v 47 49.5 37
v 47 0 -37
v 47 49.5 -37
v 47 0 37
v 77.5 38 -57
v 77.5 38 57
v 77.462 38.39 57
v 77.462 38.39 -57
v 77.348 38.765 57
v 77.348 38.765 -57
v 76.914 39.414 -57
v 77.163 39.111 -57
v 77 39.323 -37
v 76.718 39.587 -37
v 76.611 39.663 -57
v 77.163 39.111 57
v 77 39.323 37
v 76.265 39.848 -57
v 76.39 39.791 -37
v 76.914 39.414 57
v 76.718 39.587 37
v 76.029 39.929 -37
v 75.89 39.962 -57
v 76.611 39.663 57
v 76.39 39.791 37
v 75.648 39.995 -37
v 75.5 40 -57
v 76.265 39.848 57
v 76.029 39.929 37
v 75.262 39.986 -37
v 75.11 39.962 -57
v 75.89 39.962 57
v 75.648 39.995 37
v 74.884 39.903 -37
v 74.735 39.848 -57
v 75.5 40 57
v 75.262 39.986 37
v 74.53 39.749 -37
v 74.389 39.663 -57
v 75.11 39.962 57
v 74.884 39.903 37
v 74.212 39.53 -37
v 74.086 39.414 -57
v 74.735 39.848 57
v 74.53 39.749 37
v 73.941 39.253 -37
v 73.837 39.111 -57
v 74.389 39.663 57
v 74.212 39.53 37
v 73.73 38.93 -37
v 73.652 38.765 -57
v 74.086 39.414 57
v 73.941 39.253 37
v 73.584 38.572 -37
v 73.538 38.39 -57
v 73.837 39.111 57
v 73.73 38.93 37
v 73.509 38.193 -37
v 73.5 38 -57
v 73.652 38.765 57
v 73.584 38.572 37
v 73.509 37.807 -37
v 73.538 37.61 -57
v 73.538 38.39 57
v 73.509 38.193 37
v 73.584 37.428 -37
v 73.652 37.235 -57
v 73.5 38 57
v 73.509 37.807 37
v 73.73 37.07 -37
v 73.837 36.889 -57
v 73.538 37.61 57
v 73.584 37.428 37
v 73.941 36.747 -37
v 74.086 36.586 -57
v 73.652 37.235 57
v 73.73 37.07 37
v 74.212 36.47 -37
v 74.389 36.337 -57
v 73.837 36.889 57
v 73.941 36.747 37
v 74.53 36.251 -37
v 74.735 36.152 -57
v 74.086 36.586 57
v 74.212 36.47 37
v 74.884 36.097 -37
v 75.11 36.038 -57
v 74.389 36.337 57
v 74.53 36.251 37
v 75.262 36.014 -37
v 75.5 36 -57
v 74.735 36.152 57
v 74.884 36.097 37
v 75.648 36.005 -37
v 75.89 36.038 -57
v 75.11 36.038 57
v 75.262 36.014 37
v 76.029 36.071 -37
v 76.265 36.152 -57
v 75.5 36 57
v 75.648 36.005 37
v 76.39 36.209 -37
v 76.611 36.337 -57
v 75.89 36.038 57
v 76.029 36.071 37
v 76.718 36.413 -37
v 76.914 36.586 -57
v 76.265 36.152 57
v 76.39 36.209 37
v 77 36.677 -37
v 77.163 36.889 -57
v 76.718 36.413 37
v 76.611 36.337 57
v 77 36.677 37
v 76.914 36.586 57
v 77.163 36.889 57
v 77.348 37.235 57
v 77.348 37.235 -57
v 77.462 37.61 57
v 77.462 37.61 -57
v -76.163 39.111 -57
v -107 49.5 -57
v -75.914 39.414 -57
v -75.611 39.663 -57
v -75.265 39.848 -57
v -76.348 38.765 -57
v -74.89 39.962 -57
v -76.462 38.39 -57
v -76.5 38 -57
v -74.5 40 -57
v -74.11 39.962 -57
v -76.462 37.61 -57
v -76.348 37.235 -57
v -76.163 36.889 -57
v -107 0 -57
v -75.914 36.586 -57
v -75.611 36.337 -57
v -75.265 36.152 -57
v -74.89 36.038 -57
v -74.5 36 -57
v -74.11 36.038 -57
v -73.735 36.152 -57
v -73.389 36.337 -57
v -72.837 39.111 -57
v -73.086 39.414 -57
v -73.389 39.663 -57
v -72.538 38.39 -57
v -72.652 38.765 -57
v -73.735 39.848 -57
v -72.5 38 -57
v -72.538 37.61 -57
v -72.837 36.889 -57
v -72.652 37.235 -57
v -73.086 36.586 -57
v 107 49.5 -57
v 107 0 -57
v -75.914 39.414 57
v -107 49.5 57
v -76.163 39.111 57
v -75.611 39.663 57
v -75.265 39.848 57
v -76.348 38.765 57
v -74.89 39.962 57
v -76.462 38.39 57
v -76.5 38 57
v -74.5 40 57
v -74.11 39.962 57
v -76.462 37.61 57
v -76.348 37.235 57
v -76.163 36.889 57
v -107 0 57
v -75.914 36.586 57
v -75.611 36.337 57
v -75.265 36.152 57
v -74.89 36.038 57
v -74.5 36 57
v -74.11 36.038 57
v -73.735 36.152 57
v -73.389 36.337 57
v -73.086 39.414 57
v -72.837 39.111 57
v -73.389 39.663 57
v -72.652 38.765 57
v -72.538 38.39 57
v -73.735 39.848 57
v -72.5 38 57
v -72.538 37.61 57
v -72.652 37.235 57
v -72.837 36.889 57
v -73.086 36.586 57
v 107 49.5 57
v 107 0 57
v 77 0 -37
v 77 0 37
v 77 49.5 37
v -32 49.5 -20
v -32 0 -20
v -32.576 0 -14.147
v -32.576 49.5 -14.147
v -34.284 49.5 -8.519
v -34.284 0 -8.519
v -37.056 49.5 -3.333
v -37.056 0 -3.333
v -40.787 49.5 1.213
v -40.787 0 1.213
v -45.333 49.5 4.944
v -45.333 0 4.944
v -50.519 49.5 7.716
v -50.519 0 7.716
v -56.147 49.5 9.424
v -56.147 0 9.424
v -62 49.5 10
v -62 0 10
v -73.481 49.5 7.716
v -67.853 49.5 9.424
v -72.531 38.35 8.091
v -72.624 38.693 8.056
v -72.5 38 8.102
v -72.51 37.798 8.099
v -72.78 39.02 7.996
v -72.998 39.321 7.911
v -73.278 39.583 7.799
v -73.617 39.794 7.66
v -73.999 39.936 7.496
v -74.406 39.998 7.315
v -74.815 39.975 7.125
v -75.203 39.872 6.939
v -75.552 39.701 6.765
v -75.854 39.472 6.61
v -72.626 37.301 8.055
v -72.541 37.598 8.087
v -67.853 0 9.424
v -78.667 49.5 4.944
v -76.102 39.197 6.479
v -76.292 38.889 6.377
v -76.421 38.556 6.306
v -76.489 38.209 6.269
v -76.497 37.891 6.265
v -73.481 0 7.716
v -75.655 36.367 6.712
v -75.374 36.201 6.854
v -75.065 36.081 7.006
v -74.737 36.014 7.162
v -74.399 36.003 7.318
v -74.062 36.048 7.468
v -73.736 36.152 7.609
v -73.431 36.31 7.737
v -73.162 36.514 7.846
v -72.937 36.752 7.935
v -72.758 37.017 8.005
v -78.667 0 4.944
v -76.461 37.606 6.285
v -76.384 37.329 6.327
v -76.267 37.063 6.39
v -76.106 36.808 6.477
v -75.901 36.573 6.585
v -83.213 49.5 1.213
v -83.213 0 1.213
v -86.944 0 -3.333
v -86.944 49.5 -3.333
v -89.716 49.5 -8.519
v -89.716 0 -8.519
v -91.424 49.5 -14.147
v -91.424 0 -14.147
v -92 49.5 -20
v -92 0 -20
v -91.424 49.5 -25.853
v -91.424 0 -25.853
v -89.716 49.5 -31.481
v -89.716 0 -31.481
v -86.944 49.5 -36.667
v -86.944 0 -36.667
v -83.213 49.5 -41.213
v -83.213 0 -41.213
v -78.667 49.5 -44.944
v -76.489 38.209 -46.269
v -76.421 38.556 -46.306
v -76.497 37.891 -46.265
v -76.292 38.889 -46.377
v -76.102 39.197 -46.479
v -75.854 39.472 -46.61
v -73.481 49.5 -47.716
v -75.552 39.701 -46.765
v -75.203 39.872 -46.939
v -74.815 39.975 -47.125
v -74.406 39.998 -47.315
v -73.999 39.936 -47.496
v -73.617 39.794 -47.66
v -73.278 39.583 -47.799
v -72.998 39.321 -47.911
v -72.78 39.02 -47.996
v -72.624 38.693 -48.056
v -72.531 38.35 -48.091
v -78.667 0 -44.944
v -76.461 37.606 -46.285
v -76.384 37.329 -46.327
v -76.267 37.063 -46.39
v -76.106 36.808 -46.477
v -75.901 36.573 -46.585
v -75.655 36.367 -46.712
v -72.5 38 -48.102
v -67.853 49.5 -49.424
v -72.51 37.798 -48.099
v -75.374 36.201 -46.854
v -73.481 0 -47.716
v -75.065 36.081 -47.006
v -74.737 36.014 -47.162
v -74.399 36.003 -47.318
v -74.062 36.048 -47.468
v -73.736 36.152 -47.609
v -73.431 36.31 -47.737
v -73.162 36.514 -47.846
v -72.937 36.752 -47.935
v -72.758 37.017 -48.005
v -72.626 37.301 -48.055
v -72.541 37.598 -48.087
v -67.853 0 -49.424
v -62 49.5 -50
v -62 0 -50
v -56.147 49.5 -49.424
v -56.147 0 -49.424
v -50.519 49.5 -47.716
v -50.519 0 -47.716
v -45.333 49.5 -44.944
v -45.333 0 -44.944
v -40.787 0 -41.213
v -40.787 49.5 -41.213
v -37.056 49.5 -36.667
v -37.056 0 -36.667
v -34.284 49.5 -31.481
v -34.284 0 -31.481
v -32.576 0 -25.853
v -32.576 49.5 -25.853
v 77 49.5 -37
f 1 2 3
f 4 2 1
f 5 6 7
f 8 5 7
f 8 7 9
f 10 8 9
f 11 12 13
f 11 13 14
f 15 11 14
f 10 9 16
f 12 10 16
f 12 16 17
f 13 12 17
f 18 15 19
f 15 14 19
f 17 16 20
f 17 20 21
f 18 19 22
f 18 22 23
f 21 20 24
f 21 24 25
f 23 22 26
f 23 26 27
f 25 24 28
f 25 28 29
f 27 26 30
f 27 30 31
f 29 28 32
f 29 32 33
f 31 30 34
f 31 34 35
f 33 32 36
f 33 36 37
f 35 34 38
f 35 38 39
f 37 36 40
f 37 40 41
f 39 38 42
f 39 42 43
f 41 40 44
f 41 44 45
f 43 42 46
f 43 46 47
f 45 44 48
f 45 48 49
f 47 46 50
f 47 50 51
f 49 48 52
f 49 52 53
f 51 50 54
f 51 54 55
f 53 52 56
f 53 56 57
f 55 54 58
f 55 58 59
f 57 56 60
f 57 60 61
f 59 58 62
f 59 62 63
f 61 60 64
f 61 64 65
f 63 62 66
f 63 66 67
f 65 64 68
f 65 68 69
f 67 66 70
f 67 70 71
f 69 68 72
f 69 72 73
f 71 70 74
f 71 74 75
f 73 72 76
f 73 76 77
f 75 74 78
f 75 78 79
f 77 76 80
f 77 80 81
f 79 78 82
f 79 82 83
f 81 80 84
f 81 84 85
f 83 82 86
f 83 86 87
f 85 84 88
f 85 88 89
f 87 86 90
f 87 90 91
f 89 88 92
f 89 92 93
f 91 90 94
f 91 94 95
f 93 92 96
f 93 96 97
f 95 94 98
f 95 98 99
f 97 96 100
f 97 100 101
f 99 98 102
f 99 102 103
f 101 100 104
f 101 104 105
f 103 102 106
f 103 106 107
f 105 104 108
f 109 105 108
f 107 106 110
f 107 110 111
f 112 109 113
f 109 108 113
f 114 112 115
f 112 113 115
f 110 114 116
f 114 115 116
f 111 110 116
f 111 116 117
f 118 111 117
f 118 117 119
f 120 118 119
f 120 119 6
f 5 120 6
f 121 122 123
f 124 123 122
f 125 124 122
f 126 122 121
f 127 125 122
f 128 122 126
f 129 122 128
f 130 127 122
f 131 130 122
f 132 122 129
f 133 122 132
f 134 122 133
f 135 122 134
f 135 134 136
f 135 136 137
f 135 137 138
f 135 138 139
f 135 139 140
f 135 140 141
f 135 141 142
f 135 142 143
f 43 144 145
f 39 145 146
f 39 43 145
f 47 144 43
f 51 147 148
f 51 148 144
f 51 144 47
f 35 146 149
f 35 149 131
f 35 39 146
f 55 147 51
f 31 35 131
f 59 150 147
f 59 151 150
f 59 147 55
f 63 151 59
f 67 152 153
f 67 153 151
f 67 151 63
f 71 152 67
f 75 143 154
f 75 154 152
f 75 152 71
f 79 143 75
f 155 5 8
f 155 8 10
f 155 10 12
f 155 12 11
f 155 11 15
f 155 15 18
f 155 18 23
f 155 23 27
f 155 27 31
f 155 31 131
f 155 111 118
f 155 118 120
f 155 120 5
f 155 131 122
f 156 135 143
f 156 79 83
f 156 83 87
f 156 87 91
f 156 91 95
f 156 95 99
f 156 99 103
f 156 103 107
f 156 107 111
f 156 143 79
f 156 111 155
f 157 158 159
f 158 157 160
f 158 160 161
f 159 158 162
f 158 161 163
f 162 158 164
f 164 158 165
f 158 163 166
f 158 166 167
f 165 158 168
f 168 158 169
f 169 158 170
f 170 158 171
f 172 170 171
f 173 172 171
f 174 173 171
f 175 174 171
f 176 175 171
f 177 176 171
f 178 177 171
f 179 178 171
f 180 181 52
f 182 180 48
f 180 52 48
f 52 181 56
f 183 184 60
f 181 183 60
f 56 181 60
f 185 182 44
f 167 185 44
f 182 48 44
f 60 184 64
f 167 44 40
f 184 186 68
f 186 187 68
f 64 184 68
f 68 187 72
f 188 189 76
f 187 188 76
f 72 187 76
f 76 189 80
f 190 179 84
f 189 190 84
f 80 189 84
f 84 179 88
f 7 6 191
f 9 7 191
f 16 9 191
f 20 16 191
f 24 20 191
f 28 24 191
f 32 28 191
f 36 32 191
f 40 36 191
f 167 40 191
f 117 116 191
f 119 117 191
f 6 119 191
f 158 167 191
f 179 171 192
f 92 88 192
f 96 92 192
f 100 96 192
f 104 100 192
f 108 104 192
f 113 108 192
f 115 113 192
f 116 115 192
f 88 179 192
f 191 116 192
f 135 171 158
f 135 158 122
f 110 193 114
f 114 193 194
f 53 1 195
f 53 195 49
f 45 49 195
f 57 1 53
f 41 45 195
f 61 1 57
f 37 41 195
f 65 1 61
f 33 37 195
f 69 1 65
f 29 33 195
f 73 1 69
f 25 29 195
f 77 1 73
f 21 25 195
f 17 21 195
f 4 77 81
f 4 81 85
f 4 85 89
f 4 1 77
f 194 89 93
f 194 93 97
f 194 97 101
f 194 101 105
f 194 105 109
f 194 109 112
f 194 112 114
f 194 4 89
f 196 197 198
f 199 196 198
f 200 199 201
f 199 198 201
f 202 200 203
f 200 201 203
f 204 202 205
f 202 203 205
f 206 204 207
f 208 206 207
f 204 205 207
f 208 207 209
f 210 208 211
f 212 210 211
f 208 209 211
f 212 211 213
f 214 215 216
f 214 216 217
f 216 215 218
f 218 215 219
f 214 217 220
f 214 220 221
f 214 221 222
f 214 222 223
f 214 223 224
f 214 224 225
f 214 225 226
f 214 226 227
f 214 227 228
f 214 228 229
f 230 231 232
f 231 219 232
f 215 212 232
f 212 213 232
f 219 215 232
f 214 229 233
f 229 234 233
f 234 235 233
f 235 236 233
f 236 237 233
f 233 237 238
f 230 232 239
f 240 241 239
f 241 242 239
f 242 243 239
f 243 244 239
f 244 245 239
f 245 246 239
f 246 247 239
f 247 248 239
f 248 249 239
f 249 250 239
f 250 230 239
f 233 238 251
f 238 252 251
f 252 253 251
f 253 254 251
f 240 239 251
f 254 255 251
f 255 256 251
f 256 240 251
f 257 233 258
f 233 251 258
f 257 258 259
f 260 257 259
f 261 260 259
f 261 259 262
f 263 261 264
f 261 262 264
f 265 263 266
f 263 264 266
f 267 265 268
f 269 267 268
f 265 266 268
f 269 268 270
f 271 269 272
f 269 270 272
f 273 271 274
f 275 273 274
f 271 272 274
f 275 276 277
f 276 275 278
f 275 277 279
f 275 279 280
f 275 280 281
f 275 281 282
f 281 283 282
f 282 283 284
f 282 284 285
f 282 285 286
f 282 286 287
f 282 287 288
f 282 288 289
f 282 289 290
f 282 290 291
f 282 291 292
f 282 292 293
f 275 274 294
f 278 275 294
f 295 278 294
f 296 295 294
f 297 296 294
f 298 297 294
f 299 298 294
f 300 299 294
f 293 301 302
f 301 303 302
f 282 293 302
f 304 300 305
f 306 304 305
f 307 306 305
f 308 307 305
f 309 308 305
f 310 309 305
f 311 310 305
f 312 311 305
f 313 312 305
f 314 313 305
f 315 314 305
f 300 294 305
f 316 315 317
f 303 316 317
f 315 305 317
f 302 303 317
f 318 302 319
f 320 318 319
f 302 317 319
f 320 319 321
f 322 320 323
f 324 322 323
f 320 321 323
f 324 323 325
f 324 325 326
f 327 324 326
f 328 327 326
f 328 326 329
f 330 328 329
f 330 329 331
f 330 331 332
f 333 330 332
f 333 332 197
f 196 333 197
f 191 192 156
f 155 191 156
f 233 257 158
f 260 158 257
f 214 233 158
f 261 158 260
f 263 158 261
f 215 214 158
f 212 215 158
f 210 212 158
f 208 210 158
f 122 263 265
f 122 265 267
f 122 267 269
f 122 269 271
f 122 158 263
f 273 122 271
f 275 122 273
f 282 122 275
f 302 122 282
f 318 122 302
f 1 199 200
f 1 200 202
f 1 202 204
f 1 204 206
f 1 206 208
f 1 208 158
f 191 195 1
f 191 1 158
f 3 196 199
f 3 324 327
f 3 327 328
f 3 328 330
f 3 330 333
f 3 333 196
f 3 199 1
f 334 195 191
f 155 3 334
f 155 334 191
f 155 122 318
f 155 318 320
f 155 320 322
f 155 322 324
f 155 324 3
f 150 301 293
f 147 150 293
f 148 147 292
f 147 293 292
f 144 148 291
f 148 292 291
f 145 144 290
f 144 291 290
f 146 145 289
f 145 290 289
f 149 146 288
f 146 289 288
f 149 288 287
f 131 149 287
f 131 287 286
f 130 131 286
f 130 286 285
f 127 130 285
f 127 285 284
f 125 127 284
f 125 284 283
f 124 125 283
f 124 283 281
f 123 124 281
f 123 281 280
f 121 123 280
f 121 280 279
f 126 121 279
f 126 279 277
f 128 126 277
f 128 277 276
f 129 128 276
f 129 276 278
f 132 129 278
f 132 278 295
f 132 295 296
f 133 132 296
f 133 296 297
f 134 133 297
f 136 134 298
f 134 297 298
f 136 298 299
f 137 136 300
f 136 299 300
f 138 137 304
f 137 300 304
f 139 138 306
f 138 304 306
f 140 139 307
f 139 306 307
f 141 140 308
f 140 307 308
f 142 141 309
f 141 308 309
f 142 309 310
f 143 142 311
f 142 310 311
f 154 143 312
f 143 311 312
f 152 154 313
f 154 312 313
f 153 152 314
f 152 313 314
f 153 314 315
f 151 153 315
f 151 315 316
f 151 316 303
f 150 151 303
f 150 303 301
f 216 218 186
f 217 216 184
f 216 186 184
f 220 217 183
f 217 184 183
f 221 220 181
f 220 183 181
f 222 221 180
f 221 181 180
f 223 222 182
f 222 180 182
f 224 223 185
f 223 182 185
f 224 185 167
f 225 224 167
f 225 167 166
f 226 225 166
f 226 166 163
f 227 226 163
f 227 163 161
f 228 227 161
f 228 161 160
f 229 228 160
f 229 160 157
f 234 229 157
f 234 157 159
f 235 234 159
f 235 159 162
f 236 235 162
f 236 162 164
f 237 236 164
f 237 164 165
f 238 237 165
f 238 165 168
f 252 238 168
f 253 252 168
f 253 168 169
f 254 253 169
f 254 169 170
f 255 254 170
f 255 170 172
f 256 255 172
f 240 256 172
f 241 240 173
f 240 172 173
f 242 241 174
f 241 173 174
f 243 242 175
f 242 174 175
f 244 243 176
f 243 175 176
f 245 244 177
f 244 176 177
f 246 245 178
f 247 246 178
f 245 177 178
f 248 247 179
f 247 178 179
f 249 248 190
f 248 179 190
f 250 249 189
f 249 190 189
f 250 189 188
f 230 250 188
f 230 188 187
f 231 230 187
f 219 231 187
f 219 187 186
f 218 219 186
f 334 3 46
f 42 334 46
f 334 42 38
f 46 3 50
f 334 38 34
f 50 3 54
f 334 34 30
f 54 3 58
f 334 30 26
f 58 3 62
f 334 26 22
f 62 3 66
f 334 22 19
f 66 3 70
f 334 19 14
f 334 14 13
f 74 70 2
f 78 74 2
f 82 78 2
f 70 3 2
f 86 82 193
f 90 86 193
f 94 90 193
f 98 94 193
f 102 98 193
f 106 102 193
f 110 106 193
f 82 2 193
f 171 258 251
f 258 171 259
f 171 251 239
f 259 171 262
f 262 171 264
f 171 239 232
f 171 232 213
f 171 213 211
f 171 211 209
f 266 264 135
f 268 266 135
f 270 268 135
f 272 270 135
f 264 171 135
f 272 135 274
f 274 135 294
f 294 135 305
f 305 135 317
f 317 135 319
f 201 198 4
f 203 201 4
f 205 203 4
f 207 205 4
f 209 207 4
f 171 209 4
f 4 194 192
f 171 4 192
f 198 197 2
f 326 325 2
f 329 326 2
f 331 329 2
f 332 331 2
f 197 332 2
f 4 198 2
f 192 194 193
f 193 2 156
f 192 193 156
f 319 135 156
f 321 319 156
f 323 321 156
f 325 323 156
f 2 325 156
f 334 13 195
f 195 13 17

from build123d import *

# Parameters (mm, degrees)
SKETCH1_W           = 214
SKETCH1_H           = 114
BOSS_EXTRUDE1_DEPTH = 49.5
SKETCH2_R           = 2
CUT_EXTRUDE1_DEPTH  = 115
SKETCH4_R           = 30
SKETCH4_W           = 30
SKETCH4_H           = 74
CUT_EXTRUDE2_DEPTH  = 55


with BuildPart() as part:
    # Sketch1 → Boss-Extrude1 (new body)
    with BuildSketch(Plane(origin=(0, 0, 0), x_dir=(1, 0, 0), z_dir=(0, 1, 0))):
        Rectangle(SKETCH1_W, SKETCH1_H)
    extrude(amount=BOSS_EXTRUDE1_DEPTH)

    # Sketch2 → Cut-Extrude1 (cut, through all)
    with BuildSketch(Plane.XY.offset(57)):
        with Locations((-74.5, 38)):
            Circle(SKETCH2_R)
        with Locations((75.5, 38)):
            Circle(SKETCH2_R)
    extrude(amount=-CUT_EXTRUDE1_DEPTH, mode=Mode.SUBTRACT)

    # Sketch4 → Cut-Extrude2 (cut)
    with BuildSketch(Plane.XZ):
        with Locations((-62, -20)):
            Circle(SKETCH4_R)
        with Locations((62, 0)):
            Rectangle(SKETCH4_W, SKETCH4_H)
    extrude(amount=-CUT_EXTRUDE2_DEPTH, mode=Mode.SUBTRACT)


solid = part.part
